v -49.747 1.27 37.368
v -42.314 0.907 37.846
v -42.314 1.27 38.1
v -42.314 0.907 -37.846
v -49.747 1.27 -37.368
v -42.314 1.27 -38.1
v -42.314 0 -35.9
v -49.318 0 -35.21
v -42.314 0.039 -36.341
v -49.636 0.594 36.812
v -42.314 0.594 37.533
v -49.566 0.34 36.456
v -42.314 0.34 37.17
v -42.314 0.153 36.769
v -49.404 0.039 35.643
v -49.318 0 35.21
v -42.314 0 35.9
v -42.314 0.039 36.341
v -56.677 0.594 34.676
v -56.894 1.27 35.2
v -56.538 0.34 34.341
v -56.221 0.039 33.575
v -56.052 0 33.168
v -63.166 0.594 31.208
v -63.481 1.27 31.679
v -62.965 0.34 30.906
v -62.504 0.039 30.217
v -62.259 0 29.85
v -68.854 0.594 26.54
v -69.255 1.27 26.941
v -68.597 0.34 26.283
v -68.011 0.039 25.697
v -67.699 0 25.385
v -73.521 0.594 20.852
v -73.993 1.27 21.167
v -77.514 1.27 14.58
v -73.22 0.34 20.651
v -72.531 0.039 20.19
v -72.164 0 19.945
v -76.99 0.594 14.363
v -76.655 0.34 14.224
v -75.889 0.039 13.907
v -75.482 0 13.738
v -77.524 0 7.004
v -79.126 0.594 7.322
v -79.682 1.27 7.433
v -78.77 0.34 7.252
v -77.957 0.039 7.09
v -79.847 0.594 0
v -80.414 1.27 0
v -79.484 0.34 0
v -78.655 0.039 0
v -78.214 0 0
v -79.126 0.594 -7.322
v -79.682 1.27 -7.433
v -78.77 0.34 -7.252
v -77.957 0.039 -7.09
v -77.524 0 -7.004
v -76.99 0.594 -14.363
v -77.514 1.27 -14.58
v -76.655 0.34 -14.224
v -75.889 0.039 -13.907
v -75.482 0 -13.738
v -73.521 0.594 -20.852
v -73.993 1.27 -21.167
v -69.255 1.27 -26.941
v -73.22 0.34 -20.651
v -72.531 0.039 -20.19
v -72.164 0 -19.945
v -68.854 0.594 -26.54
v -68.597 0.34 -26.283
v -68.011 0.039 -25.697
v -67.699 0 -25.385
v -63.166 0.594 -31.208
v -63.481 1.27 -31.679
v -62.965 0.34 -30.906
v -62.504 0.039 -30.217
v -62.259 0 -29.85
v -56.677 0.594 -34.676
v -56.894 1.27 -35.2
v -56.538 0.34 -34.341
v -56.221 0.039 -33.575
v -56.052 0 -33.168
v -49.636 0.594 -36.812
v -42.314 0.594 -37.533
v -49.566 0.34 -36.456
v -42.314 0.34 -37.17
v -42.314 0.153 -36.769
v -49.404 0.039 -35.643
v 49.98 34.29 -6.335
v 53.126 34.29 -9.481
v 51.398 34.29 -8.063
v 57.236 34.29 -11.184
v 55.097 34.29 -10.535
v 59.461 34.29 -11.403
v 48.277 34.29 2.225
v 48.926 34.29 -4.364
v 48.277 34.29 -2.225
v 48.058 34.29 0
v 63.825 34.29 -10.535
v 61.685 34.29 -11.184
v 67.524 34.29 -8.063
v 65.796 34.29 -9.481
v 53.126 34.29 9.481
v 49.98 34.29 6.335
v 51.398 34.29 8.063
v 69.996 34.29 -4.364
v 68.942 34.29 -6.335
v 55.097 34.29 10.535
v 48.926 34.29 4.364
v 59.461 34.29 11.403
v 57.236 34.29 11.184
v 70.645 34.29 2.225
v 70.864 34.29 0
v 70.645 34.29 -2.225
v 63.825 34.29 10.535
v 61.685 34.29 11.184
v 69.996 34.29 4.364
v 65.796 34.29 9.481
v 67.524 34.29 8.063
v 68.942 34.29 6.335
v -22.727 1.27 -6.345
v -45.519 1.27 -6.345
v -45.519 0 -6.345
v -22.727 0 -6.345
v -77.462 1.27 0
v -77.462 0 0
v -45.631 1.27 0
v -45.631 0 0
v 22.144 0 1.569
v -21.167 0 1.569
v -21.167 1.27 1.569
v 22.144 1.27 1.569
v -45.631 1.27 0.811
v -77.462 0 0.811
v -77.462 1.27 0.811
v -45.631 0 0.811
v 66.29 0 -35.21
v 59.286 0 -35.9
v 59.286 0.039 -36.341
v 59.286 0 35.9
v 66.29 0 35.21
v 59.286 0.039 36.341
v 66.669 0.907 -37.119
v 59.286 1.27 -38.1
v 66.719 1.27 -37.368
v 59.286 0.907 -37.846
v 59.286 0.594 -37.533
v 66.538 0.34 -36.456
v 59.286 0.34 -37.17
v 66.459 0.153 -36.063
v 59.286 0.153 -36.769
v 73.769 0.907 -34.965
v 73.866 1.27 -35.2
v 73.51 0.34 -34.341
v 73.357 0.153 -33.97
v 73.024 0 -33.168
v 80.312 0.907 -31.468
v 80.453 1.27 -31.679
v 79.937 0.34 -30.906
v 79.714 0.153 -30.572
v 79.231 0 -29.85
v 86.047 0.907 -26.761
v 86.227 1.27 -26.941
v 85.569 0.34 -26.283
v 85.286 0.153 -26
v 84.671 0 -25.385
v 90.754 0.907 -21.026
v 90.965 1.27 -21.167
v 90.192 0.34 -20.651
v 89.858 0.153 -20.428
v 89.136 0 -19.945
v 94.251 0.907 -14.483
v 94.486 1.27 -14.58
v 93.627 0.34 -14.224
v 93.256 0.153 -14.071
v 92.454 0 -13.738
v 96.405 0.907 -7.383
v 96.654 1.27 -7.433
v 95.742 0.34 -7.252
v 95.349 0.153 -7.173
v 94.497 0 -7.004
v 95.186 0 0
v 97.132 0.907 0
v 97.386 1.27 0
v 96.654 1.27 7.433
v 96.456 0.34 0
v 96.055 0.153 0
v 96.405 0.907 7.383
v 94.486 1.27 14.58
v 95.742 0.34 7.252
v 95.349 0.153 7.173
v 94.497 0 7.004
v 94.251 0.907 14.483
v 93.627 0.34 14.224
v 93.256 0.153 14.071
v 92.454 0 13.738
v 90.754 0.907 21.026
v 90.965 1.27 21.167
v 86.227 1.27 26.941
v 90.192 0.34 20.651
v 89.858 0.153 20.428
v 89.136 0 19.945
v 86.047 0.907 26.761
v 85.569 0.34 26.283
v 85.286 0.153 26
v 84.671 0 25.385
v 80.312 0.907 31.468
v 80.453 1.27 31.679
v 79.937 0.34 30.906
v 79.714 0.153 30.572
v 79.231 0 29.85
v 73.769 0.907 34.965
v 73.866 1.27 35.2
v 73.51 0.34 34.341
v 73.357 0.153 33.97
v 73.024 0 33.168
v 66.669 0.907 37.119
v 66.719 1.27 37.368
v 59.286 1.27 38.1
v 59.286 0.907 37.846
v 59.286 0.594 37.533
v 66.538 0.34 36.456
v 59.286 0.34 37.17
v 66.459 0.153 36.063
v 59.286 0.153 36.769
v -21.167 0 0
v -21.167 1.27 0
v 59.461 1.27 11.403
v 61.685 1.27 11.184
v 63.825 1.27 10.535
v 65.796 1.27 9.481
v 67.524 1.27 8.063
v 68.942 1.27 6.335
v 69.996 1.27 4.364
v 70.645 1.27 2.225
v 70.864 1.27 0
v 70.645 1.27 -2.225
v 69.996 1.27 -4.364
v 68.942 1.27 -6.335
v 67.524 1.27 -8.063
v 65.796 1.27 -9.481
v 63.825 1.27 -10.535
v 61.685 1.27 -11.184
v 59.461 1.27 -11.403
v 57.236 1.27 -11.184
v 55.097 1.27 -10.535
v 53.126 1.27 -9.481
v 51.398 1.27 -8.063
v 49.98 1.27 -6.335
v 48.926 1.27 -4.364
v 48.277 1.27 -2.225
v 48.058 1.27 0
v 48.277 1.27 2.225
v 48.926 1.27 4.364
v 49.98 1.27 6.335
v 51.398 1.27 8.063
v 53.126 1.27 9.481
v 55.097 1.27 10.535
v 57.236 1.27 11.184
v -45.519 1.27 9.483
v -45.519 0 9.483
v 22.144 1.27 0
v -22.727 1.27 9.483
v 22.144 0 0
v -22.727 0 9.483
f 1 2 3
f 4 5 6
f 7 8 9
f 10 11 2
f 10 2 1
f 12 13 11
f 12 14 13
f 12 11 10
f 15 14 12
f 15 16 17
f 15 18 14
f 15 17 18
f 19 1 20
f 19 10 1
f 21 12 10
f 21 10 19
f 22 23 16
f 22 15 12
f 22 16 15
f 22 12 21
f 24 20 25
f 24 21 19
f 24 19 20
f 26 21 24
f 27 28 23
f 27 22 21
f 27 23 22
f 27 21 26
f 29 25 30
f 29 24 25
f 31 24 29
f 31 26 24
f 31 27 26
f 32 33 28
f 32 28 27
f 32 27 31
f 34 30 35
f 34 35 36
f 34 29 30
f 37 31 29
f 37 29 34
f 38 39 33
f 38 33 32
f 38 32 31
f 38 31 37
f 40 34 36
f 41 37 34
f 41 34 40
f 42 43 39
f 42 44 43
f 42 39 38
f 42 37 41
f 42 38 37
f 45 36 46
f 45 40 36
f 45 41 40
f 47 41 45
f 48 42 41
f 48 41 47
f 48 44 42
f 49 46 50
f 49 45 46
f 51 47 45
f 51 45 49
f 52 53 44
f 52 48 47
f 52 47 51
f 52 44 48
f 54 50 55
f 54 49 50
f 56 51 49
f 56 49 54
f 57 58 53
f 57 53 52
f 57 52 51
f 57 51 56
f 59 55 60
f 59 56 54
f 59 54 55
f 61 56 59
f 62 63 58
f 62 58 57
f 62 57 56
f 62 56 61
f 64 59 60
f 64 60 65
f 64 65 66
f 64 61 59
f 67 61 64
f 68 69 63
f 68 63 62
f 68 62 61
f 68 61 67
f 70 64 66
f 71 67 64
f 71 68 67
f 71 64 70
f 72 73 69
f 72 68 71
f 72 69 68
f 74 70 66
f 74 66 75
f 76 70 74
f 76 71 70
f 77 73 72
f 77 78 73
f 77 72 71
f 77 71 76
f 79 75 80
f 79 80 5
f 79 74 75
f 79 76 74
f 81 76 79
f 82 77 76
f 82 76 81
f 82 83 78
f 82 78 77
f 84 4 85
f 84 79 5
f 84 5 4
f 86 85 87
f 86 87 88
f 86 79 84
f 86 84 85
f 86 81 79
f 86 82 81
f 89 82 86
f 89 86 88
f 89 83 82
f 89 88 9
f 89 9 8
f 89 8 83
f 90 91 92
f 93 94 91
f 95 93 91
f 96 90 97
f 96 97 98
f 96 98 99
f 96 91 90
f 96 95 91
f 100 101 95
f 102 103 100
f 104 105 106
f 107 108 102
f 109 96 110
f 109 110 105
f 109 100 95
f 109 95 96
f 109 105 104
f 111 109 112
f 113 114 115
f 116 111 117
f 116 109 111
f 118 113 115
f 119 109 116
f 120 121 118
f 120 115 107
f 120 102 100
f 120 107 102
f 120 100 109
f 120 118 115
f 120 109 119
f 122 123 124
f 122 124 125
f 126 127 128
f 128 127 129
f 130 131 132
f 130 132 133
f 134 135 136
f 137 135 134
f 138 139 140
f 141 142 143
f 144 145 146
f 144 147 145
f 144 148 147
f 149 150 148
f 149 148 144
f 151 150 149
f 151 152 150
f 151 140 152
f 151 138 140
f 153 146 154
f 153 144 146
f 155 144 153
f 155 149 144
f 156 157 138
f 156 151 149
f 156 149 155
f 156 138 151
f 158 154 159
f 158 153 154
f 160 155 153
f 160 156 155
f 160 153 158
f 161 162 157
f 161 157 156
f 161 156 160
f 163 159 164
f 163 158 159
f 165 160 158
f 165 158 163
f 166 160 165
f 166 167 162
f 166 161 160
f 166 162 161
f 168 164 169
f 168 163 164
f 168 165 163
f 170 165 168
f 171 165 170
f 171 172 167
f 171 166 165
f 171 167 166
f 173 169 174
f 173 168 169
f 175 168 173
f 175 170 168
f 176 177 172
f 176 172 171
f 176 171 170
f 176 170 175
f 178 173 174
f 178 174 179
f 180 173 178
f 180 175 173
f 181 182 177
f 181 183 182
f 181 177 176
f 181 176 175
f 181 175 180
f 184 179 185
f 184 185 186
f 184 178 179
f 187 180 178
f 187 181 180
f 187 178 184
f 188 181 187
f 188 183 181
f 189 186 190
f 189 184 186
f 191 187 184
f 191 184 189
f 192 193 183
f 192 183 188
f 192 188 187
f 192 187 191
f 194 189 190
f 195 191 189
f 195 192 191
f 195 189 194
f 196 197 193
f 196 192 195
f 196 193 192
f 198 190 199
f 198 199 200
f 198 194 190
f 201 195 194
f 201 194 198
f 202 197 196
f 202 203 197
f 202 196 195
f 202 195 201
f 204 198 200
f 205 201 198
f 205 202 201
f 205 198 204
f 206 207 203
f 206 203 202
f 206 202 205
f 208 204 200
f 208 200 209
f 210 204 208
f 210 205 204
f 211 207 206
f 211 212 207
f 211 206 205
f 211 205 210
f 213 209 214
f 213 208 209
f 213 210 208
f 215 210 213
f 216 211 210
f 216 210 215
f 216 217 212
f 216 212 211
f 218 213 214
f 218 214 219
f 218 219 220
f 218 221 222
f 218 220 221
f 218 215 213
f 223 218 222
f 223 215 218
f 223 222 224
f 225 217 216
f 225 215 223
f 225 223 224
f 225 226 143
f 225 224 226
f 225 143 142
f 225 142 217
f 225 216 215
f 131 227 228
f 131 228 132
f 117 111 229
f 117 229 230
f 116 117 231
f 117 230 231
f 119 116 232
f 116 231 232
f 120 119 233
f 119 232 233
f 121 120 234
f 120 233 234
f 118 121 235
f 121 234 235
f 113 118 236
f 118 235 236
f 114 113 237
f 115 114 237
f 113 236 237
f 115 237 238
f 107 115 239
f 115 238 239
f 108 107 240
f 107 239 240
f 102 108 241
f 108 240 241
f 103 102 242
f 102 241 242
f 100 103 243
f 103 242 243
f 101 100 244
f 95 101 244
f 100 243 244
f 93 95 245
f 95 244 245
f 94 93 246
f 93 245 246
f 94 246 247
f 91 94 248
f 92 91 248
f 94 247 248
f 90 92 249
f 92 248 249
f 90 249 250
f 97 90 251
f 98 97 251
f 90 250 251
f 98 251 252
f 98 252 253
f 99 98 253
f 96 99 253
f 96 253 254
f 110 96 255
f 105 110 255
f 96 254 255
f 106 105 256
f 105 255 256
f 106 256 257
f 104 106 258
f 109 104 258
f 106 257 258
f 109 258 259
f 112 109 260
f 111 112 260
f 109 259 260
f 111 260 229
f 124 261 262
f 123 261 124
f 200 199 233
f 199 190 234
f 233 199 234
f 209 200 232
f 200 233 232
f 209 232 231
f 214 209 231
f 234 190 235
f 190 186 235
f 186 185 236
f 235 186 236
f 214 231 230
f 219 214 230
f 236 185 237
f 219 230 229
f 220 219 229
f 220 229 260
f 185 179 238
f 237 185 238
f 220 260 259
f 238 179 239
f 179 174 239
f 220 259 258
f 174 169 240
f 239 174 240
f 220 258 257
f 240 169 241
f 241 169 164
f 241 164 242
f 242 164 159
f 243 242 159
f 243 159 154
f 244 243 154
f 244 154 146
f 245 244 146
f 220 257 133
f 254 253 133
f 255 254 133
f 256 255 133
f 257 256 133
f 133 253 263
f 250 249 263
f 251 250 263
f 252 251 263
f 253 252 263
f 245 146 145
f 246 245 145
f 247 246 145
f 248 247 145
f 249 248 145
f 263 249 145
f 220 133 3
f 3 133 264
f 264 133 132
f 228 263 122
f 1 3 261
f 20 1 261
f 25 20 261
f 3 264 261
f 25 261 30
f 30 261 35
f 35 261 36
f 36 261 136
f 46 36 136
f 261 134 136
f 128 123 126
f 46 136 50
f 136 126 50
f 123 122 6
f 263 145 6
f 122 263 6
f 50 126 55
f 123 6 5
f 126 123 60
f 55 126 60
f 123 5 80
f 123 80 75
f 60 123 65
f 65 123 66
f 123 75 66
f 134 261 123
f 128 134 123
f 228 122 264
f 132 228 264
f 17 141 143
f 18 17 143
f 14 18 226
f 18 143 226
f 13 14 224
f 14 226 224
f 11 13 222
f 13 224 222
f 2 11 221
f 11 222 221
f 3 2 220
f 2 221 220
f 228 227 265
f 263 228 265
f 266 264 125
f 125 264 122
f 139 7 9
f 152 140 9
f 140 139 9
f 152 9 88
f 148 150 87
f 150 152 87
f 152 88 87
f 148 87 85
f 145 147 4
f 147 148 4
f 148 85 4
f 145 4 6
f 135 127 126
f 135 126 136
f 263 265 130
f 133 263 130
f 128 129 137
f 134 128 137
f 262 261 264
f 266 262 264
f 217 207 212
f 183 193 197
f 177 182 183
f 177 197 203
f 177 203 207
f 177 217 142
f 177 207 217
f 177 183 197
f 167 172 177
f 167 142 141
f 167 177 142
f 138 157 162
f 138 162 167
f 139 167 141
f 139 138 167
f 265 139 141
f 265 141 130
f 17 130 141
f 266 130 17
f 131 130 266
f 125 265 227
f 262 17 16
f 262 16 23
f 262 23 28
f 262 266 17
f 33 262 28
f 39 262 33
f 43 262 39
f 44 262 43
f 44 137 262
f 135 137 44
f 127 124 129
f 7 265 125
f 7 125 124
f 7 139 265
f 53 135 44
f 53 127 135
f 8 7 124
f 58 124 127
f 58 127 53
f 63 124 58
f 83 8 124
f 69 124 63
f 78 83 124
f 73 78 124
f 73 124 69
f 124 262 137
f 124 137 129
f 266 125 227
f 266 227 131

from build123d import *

# Parameters (mm, degrees)
BOSS_EXTRUDE4_DEPTH = 1.27
SKETCH11_R          = 11.402996403
BOSS_EXTRUDE6_DEPTH = 33.02
SKETCH12_W          = 22.792557874
SKETCH12_H          = 15.82816519
CUT_EXTRUDE4_DEPTH  = 12.7
FILLET1_R           = 2.54
SKETCH13_W          = 31.831001044
SKETCH13_H          = 0.811195954
SKETCH13_W_2        = 43.310342169
SKETCH13_H_2        = 1.569408792
CUT_EXTRUDE5_DEPTH  = 22.86


with BuildPart() as part:
    # Sketch2 → Boss-Extrude4 (new body)
    with BuildSketch(Plane(origin=(0, 0, 0), x_dir=(1, 0, 0), z_dir=(0, 1, 0))):
        with BuildLine():
            Line((-42.31395881, 38.1), (59.28604119, 38.1))
            ThreePointArc((59.28604119, 38.1), (97.38604119, 0), (59.28604119, -38.1))
            Line((59.28604119, -38.1), (-42.31395881, -38.1))
            ThreePointArc((-42.31395881, -38.1), (-80.41395881, 0), (-42.31395881, 38.1))
        make_face()
    extrude(amount=BOSS_EXTRUDE4_DEPTH)

    # Sketch11 → Boss-Extrude6 (add)
    with BuildSketch(Plane(origin=(0, 1.27, 0), x_dir=(1, 0, 0), z_dir=(0, 1, 0))):
        with Locations(Location((59.460873827, 0, 0), (0, 0, 270))):
            Circle(SKETCH11_R)
    extrude(amount=BOSS_EXTRUDE6_DEPTH)

    # Sketch12 → Cut-Extrude4 (cut)
    with BuildSketch(Plane(origin=(0, 1.27, 0), x_dir=(1, 0, 0), z_dir=(0, 1, 0))):
        with Locations((-34.122794633, -1.569408792)):
            Rectangle(SKETCH12_W, SKETCH12_H)
    extrude(amount=-CUT_EXTRUDE4_DEPTH, mode=Mode.SUBTRACT)

    # Fillet1
    # the kernel refuses this fillet: 2.54 mm, written as the material it takes off along each edge
    with BuildSketch(Plane(origin=(-42.31395881, 0, 0), x_dir=(0, 0, 1), z_dir=(1, 0, 0))) as fillet1_piece_1:
        with BuildLine():
            CenterArc((35.900295474, -2.54), FILLET1_R, 30, 60)
            Line((35.900295474, 0), (35.900295474, 0.0508))
            Line((35.900295474, 0.0508), (38.1, 0.0508))
            Line((38.1, 0.0508), (38.1508, 0))
            ThreePointArc((38.1508, 0), (38.1508, -0.635), (38.143994091, -1.2446))
            Line((38.143994091, -1.2446), (38.1, -1.27))
        make_face()
    revolve(axis=Axis((-42.31395881, 0, 0), (0, -1, 0)), revolution_arc=180, mode=Mode.SUBTRACT)
    with BuildSketch(Plane(origin=(59.28604119, 0, 38.1), x_dir=(0, 1, 0), z_dir=(-1, 0, 0))) as fillet1_piece_2:
        with BuildLine():
            CenterArc((2.54, 2.199704526), FILLET1_R, 180, 60)
            Line((0, 2.199704526), (-0.0508, 2.199704526))
            Line((-0.0508, 2.199704526), (-0.0508, 0))
            Line((-0.0508, 0), (0, -0.0508))
            ThreePointArc((0, -0.0508), (0.635, -0.0508), (1.2446, -0.043994091))
            Line((1.2446, -0.043994091), (1.27, 0))
        make_face()
    extrude(amount=101.6, mode=Mode.SUBTRACT)
    with BuildSketch(Plane(origin=(59.28604119, 0, 0), x_dir=(0, 0, -1), z_dir=(-1, 0, 0))) as fillet1_piece_3:
        with BuildLine():
            CenterArc((35.900295474, -2.54), FILLET1_R, 30, 60)
            Line((35.900295474, 0), (35.900295474, 0.0508))
            Line((35.900295474, 0.0508), (38.1, 0.0508))
            Line((38.1, 0.0508), (38.1508, 0))
            ThreePointArc((38.1508, 0), (38.1508, -0.635), (38.143994091, -1.2446))
            Line((38.143994091, -1.2446), (38.1, -1.27))
        make_face()
    revolve(axis=Axis((59.28604119, 0, 0), (0, -1, 0)), revolution_arc=180, mode=Mode.SUBTRACT)
    with BuildSketch(Plane(origin=(-42.31395881, 0, -38.1), x_dir=(0, 0, 1), z_dir=(1, 0, 0))) as fillet1_piece_4:
        with BuildLine():
            CenterArc((2.199704526, -2.54), FILLET1_R, 90, 60)
            Line((0, -1.27), (-0.043994091, -1.2446))
            ThreePointArc((-0.043994091, -1.2446), (-0.0508, -0.635), (-0.0508, 0))
            Line((-0.0508, 0), (0, 0.0508))
            Line((0, 0.0508), (2.199704526, 0.0508))
            Line((2.199704526, 0.0508), (2.199704526, 0))
        make_face()
    extrude(amount=101.6, mode=Mode.SUBTRACT)

    # Sketch13 → Cut-Extrude5 (cut)
    with BuildSketch(Plane.XZ):
        with Locations((-61.546134254, 0.405597977)):
            Rectangle(SKETCH13_W, SKETCH13_H)
        with Locations((0.488633532, 0.784704396)):
            Rectangle(SKETCH13_W_2, SKETCH13_H_2)
    extrude(amount=-CUT_EXTRUDE5_DEPTH, mode=Mode.SUBTRACT)


solid = part.part
